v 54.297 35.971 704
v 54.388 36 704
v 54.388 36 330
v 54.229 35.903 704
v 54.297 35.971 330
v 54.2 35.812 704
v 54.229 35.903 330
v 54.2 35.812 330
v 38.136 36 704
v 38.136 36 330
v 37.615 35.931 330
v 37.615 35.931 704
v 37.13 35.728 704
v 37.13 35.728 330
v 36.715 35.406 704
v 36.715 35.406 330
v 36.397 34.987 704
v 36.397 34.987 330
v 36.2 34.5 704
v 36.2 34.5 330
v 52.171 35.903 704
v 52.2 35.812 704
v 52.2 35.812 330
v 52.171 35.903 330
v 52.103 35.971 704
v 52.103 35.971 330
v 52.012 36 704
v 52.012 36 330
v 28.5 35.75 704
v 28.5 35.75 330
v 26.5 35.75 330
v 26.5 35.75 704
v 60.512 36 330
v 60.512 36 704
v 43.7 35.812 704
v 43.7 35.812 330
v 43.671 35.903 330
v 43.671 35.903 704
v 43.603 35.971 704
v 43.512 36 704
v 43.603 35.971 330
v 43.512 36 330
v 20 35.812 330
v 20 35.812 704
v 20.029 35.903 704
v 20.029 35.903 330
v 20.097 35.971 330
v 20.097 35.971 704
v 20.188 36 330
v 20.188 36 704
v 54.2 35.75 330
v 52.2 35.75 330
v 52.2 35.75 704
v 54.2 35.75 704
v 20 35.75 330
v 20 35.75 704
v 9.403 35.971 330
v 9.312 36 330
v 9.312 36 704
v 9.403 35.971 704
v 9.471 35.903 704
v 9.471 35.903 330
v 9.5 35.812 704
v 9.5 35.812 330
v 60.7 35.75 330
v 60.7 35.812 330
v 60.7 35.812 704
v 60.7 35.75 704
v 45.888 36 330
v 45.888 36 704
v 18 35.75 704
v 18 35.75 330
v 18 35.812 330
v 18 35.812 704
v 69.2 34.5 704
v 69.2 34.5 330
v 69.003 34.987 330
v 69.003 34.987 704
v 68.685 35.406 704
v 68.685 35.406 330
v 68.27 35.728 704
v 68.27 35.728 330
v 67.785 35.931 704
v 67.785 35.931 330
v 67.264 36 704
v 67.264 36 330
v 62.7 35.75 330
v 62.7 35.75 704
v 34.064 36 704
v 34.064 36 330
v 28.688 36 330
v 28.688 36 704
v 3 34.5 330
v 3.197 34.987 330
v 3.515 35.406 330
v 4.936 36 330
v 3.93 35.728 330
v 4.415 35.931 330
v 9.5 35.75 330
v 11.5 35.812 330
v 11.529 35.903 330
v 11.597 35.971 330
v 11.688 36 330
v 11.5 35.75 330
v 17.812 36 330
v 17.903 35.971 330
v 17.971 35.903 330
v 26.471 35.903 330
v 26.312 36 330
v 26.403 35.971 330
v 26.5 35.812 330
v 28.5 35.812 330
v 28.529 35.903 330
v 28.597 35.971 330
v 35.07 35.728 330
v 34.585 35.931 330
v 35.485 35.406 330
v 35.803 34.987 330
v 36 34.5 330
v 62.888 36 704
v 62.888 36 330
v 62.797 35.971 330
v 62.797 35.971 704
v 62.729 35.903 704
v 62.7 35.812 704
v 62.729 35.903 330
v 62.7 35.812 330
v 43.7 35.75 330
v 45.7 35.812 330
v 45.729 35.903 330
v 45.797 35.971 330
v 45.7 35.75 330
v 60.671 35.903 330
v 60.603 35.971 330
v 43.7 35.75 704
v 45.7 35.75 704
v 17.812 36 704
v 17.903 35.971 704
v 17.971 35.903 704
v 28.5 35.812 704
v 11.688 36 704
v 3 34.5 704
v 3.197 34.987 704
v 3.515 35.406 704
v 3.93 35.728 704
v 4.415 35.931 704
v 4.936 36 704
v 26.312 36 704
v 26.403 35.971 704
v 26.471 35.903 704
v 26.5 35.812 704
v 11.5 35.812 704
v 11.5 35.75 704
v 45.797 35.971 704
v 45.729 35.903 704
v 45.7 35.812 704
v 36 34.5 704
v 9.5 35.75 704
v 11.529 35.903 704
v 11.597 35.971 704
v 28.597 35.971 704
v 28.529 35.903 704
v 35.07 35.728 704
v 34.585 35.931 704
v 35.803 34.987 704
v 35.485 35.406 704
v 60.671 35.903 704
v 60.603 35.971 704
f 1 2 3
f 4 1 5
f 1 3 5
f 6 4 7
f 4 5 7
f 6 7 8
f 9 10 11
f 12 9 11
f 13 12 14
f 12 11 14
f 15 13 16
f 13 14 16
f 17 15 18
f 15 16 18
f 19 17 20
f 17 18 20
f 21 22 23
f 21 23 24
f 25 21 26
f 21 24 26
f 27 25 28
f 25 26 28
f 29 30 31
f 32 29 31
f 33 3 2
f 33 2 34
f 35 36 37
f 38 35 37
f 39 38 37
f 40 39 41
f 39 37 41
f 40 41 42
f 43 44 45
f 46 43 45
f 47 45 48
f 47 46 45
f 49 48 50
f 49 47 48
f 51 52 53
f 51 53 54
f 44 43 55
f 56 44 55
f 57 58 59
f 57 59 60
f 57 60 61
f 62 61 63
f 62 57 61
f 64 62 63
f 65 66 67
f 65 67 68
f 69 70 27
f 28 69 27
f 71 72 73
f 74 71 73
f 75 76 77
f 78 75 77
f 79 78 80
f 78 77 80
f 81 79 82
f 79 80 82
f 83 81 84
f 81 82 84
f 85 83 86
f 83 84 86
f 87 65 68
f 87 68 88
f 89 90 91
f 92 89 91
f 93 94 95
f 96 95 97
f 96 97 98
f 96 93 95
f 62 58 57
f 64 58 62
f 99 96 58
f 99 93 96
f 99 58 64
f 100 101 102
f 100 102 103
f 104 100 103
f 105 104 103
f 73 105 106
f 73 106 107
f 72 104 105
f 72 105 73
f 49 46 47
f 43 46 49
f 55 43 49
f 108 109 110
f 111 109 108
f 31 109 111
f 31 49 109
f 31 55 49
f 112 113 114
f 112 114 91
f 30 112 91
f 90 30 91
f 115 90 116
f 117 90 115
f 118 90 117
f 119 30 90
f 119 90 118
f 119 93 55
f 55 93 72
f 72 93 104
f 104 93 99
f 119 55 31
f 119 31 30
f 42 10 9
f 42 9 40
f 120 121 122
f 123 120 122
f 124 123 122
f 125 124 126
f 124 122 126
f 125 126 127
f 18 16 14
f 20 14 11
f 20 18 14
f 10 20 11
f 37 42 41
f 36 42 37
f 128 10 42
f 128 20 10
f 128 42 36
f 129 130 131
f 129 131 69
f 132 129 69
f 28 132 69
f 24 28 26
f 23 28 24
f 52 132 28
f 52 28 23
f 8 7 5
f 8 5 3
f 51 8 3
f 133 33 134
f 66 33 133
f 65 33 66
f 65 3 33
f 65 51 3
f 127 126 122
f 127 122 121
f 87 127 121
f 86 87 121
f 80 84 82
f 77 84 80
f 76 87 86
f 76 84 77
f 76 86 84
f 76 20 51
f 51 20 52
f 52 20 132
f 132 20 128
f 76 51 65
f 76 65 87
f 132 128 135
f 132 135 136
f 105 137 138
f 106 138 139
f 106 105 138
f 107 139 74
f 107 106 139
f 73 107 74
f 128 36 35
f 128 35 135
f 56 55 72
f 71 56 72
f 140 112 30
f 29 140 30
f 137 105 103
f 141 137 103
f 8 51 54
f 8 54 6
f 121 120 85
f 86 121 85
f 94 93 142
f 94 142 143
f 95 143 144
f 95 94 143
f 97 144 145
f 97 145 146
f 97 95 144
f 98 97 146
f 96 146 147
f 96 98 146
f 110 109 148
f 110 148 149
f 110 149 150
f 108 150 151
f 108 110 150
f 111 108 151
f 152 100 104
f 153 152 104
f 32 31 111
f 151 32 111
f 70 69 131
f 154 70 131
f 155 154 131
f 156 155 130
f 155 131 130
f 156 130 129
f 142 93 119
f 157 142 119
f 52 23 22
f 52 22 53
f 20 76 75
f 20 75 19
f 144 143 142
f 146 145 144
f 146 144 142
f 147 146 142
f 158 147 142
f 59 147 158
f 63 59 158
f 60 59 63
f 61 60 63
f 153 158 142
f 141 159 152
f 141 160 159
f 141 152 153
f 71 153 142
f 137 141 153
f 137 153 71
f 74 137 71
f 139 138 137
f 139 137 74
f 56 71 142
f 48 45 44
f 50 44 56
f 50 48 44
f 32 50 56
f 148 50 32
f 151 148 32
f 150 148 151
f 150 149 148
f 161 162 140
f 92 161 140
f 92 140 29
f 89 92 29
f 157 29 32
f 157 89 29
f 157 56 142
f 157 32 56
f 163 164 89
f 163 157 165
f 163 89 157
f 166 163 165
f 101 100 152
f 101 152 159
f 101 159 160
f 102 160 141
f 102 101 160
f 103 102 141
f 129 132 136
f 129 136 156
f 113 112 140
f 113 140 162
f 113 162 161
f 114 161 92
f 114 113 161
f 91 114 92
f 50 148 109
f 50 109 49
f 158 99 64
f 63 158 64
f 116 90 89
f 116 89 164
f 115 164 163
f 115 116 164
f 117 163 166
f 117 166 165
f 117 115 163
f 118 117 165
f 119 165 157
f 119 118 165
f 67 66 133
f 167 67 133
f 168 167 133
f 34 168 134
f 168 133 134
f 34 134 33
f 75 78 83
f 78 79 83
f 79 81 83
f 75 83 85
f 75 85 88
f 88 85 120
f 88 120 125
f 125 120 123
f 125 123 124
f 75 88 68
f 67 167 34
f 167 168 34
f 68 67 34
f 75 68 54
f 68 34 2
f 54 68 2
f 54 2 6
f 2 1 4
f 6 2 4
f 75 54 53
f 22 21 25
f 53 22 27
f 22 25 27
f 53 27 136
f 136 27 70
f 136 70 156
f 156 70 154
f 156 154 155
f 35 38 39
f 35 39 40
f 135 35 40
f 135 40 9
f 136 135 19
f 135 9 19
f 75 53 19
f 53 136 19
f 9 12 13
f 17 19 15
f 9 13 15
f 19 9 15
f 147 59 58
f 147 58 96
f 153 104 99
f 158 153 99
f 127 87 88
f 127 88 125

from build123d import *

# Parameters (mm, degrees)
F1_DEPTH    = 704
F3_DEPTH    = 704.001
F4_T1_DEPTH = 713.6824583655
F5_T1_DEPTH = 705.0048304175
F8_W        = 165.4744656086
F8_H        = 350.9649447352
F9_DEPTH    = 1.501


# Not quite as in the source:
# - a fillet or chamfer that OpenCascade refuses, or shapes differently, is made with other operations: its cross-section is extruded or revolved along the edge and cut away or added


with BuildPart() as f1:
    # F0 (on Top) → F1 (new body)
    with BuildSketch(Plane.XY):
        with BuildLine():
            Line((0, 7.5), (0, 0))
            Line((0, 0), (1.5, 0))
            Line((1.5, 0), (1.5, 33.5))
            ThreePointArc((1.5, 33.5), (1.5761204675, 33.8826834324), (1.7928932188, 34.2071067812))
            ThreePointArc((1.7928932188, 34.2071067812), (2.1173165676, 34.4238795325), (2.5, 34.5))
            Line((2.5, 34.5), (36, 34.5))
            Line((36, 34.5), (36, 36))
            Line((36, 36), (28.5, 36))
            Line((28.5, 36), (28.5, 35.75))
            Line((28.5, 35.75), (26.5, 35.75))
            Line((26.5, 35.75), (26.5, 36))
            Line((26.5, 36), (20, 36))
            Line((20, 36), (20, 35.75))
            Line((20, 35.75), (18, 35.75))
            Line((18, 35.75), (18, 36))
            Line((18, 36), (11.5, 36))
            Line((11.5, 36), (11.5, 35.75))
            Line((11.5, 35.75), (9.5, 35.75))
            Line((9.5, 35.75), (9.5, 36))
            Line((9.5, 36), (2, 36))
            ThreePointArc((2, 36), (1.2346331353, 35.847759065), (0.5857864376, 35.4142135624))
            ThreePointArc((0.5857864376, 35.4142135624), (0.152240935, 34.7653668647), (0, 34))
            Line((0, 34), (0, 26.5))
            Line((0, 26.5), (0.25, 26.5))
            Line((0.25, 26.5), (0.25, 24.5))
            Line((0.25, 24.5), (0, 24.5))
            Line((0, 24.5), (0, 18))
            Line((0, 18), (0.25, 18))
            Line((0.25, 18), (0.25, 16))
            Line((0.25, 16), (0, 16))
            Line((0, 16), (0, 9.5))
            Line((0, 9.5), (0.25, 9.5))
            Line((0.25, 9.5), (0.25, 7.5))
            Line((0.25, 7.5), (0, 7.5))
        make_face()
    extrude(amount=F1_DEPTH)

    # F2 (on face) → F3 (cut, through all)
    with BuildSketch(Plane.XY.offset(704)):
        with BuildLine():
            Line((2, 36), (3, 36))
            Line((3, 36), (3, 37.0590753547))
            Line((3, 37.0590753547), (0, 37.0590753547))
            Line((0, 37.0590753547), (0, 34))
            ThreePointArc((0, 34), (0.5857864376, 35.4142135624), (2, 36))
        make_face()
        with BuildLine():
            Line((1.5, 33.5), (1.5, 0))
            Line((1.5, 0), (3, 0))
            Line((3, 0), (3, 34.5))
            Line((3, 34.5), (2.5, 34.5))
            ThreePointArc((2.5, 34.5), (1.7928932188, 34.2071067812), (1.5, 33.5))
        make_face()
        with BuildLine():
            Line((0, 7.5), (0, 0))
            Line((0, 0), (1.5, 0))
            Line((1.5, 0), (1.5, 33.5))
            ThreePointArc((1.5, 33.5), (1.7928932188, 34.2071067812), (2.5, 34.5))
            Line((2.5, 34.5), (3, 34.5))
            Line((3, 34.5), (3, 36))
            Line((3, 36), (2, 36))
            ThreePointArc((2, 36), (0.5857864376, 35.4142135624), (0, 34))
            Line((0, 34), (0, 26.5))
            Line((0, 26.5), (0.25, 26.5))
            Line((0.25, 26.5), (0.25, 24.5))
            Line((0.25, 24.5), (0, 24.5))
            Line((0, 24.5), (0, 18))
            Line((0, 18), (0.25, 18))
            Line((0.25, 18), (0.25, 16))
            Line((0.25, 16), (0, 16))
            Line((0, 16), (0, 9.5))
            Line((0, 9.5), (0.25, 9.5))
            Line((0.25, 9.5), (0.25, 7.5))
            Line((0.25, 7.5), (0, 7.5))
        make_face()
    extrude(amount=-F3_DEPTH, mode=Mode.SUBTRACT)

    # F4: fillet of radius 2 on 2 edges, made by hand

    # F4_s2 → F4_t1 (cut)
    with BuildSketch(Plane.XY.offset(-4.8412291828)):
        with BuildLine():
            ThreePointArc((3, 34.5), (3.7117468017, 35.5811388301), (4.9364916731, 36))
            Line((4.9364916731, 36), (3, 36))
            Line((3, 36), (3, 34.5))
        make_face()
        with BuildLine():
            ThreePointArc((34.0635083269, 36), (35.2882531983, 35.5811388301), (36, 34.5))
            Line((36, 34.5), (36, 36))
            Line((36, 36), (34.0635083269, 36))
        make_face()
    extrude(amount=F4_T1_DEPTH, mode=Mode.SUBTRACT)

    # F5: fillet of radius 0.2 on 6 edges, made by hand

    # F5_s2 → F5_t1 (cut)
    with BuildSketch(Plane.XY.offset(-0.5024152088)):
        with BuildLine():
            ThreePointArc((17.7990343146, 36.0004), (17.9414213562, 35.9414213562), (18.0004, 35.7990343146))
            Line((18.0004, 35.7990343146), (18.0205365685, 35.7990343146))
            ThreePointArc((18.0205365685, 35.7990343146), (18.0201365685, 35.8995171573), (18.0201365685, 36))
            Line((18.0201365685, 36), (18, 36.0201365685))
            ThreePointArc((18, 36.0201365685), (17.8995171573, 36.0201365685), (17.7990343146, 36.0205365685))
            Line((17.7990343146, 36.0205365685), (17.7990343146, 36.0004))
        make_face()
        with BuildLine():
            ThreePointArc((19.9996, 35.7990343146), (20.0585786438, 35.9414213562), (20.2009656854, 36.0004))
            Line((20.2009656854, 36.0004), (20.2009656854, 36.0205365685))
            ThreePointArc((20.2009656854, 36.0205365685), (20.1004828427, 36.0201365685), (20, 36.0201365685))
            Line((20, 36.0201365685), (19.9798634315, 36))
            ThreePointArc((19.9798634315, 36), (19.9798634315, 35.8995171573), (19.9794634315, 35.7990343146))
            Line((19.9794634315, 35.7990343146), (19.9996, 35.7990343146))
        make_face()
        with BuildLine():
            ThreePointArc((28.4996, 35.7990343146), (28.5585786438, 35.9414213562), (28.7009656854, 36.0004))
            Line((28.7009656854, 36.0004), (28.7009656854, 36.0205365685))
            ThreePointArc((28.7009656854, 36.0205365685), (28.6004828427, 36.0201365685), (28.5, 36.0201365685))
            Line((28.5, 36.0201365685), (28.4798634315, 36))
            ThreePointArc((28.4798634315, 36), (28.4798634315, 35.8995171573), (28.4794634315, 35.7990343146))
            Line((28.4794634315, 35.7990343146), (28.4996, 35.7990343146))
        make_face()
        with BuildLine():
            ThreePointArc((26.2990343146, 36.0004), (26.4414213562, 35.9414213562), (26.5004, 35.7990343146))
            Line((26.5004, 35.7990343146), (26.5205365685, 35.7990343146))
            ThreePointArc((26.5205365685, 35.7990343146), (26.5201365685, 35.8995171573), (26.5201365685, 36))
            Line((26.5201365685, 36), (26.5, 36.0201365685))
            ThreePointArc((26.5, 36.0201365685), (26.3995171573, 36.0201365685), (26.2990343146, 36.0205365685))
            Line((26.2990343146, 36.0205365685), (26.2990343146, 36.0004))
        make_face()
        with BuildLine():
            ThreePointArc((9.2990343146, 36.0004), (9.4414213562, 35.9414213562), (9.5004, 35.7990343146))
            Line((9.5004, 35.7990343146), (9.5205365685, 35.7990343146))
            ThreePointArc((9.5205365685, 35.7990343146), (9.5201365685, 35.8995171573), (9.5201365685, 36))
            Line((9.5201365685, 36), (9.5, 36.0201365685))
            ThreePointArc((9.5, 36.0201365685), (9.3995171573, 36.0201365685), (9.2990343146, 36.0205365685))
            Line((9.2990343146, 36.0205365685), (9.2990343146, 36.0004))
        make_face()
        with BuildLine():
            ThreePointArc((11.4996, 35.7990343146), (11.5585786438, 35.9414213562), (11.7009656854, 36.0004))
            Line((11.7009656854, 36.0004), (11.7009656854, 36.0205365685))
            ThreePointArc((11.7009656854, 36.0205365685), (11.6004828427, 36.0201365685), (11.5, 36.0201365685))
            Line((11.5, 36.0201365685), (11.4798634315, 36))
            ThreePointArc((11.4798634315, 36), (11.4798634315, 35.8995171573), (11.4794634315, 35.7990343146))
            Line((11.4794634315, 35.7990343146), (11.4996, 35.7990343146))
        make_face()
    extrude(amount=F5_T1_DEPTH, mode=Mode.SUBTRACT)


with BuildPart() as f7_1:
    # F7: instance of F1
    add(f1.part.mirror(Plane.YZ.offset(36.1)))


with BuildPart() as f9_tool:
    # F8 (on face) → F9 (new body, through all)
    with BuildSketch(Plane.XZ.offset(-34.5)):
        with Locations((85.7372328043, 154.5175276324)):
            Rectangle(F8_W, F8_H)
    extrude(amount=-F9_DEPTH)


with BuildPart() as f1_1:
    add(f1.part)

    # F9: cut by f9_tool
    add(f9_tool.part, mode=Mode.SUBTRACT)


with BuildPart() as f7_1_1:
    add(f7_1.part)

    # F9: cut by f9_tool
    add(f9_tool.part, mode=Mode.SUBTRACT)


solid = Compound([f1_1.part, f7_1_1.part])
